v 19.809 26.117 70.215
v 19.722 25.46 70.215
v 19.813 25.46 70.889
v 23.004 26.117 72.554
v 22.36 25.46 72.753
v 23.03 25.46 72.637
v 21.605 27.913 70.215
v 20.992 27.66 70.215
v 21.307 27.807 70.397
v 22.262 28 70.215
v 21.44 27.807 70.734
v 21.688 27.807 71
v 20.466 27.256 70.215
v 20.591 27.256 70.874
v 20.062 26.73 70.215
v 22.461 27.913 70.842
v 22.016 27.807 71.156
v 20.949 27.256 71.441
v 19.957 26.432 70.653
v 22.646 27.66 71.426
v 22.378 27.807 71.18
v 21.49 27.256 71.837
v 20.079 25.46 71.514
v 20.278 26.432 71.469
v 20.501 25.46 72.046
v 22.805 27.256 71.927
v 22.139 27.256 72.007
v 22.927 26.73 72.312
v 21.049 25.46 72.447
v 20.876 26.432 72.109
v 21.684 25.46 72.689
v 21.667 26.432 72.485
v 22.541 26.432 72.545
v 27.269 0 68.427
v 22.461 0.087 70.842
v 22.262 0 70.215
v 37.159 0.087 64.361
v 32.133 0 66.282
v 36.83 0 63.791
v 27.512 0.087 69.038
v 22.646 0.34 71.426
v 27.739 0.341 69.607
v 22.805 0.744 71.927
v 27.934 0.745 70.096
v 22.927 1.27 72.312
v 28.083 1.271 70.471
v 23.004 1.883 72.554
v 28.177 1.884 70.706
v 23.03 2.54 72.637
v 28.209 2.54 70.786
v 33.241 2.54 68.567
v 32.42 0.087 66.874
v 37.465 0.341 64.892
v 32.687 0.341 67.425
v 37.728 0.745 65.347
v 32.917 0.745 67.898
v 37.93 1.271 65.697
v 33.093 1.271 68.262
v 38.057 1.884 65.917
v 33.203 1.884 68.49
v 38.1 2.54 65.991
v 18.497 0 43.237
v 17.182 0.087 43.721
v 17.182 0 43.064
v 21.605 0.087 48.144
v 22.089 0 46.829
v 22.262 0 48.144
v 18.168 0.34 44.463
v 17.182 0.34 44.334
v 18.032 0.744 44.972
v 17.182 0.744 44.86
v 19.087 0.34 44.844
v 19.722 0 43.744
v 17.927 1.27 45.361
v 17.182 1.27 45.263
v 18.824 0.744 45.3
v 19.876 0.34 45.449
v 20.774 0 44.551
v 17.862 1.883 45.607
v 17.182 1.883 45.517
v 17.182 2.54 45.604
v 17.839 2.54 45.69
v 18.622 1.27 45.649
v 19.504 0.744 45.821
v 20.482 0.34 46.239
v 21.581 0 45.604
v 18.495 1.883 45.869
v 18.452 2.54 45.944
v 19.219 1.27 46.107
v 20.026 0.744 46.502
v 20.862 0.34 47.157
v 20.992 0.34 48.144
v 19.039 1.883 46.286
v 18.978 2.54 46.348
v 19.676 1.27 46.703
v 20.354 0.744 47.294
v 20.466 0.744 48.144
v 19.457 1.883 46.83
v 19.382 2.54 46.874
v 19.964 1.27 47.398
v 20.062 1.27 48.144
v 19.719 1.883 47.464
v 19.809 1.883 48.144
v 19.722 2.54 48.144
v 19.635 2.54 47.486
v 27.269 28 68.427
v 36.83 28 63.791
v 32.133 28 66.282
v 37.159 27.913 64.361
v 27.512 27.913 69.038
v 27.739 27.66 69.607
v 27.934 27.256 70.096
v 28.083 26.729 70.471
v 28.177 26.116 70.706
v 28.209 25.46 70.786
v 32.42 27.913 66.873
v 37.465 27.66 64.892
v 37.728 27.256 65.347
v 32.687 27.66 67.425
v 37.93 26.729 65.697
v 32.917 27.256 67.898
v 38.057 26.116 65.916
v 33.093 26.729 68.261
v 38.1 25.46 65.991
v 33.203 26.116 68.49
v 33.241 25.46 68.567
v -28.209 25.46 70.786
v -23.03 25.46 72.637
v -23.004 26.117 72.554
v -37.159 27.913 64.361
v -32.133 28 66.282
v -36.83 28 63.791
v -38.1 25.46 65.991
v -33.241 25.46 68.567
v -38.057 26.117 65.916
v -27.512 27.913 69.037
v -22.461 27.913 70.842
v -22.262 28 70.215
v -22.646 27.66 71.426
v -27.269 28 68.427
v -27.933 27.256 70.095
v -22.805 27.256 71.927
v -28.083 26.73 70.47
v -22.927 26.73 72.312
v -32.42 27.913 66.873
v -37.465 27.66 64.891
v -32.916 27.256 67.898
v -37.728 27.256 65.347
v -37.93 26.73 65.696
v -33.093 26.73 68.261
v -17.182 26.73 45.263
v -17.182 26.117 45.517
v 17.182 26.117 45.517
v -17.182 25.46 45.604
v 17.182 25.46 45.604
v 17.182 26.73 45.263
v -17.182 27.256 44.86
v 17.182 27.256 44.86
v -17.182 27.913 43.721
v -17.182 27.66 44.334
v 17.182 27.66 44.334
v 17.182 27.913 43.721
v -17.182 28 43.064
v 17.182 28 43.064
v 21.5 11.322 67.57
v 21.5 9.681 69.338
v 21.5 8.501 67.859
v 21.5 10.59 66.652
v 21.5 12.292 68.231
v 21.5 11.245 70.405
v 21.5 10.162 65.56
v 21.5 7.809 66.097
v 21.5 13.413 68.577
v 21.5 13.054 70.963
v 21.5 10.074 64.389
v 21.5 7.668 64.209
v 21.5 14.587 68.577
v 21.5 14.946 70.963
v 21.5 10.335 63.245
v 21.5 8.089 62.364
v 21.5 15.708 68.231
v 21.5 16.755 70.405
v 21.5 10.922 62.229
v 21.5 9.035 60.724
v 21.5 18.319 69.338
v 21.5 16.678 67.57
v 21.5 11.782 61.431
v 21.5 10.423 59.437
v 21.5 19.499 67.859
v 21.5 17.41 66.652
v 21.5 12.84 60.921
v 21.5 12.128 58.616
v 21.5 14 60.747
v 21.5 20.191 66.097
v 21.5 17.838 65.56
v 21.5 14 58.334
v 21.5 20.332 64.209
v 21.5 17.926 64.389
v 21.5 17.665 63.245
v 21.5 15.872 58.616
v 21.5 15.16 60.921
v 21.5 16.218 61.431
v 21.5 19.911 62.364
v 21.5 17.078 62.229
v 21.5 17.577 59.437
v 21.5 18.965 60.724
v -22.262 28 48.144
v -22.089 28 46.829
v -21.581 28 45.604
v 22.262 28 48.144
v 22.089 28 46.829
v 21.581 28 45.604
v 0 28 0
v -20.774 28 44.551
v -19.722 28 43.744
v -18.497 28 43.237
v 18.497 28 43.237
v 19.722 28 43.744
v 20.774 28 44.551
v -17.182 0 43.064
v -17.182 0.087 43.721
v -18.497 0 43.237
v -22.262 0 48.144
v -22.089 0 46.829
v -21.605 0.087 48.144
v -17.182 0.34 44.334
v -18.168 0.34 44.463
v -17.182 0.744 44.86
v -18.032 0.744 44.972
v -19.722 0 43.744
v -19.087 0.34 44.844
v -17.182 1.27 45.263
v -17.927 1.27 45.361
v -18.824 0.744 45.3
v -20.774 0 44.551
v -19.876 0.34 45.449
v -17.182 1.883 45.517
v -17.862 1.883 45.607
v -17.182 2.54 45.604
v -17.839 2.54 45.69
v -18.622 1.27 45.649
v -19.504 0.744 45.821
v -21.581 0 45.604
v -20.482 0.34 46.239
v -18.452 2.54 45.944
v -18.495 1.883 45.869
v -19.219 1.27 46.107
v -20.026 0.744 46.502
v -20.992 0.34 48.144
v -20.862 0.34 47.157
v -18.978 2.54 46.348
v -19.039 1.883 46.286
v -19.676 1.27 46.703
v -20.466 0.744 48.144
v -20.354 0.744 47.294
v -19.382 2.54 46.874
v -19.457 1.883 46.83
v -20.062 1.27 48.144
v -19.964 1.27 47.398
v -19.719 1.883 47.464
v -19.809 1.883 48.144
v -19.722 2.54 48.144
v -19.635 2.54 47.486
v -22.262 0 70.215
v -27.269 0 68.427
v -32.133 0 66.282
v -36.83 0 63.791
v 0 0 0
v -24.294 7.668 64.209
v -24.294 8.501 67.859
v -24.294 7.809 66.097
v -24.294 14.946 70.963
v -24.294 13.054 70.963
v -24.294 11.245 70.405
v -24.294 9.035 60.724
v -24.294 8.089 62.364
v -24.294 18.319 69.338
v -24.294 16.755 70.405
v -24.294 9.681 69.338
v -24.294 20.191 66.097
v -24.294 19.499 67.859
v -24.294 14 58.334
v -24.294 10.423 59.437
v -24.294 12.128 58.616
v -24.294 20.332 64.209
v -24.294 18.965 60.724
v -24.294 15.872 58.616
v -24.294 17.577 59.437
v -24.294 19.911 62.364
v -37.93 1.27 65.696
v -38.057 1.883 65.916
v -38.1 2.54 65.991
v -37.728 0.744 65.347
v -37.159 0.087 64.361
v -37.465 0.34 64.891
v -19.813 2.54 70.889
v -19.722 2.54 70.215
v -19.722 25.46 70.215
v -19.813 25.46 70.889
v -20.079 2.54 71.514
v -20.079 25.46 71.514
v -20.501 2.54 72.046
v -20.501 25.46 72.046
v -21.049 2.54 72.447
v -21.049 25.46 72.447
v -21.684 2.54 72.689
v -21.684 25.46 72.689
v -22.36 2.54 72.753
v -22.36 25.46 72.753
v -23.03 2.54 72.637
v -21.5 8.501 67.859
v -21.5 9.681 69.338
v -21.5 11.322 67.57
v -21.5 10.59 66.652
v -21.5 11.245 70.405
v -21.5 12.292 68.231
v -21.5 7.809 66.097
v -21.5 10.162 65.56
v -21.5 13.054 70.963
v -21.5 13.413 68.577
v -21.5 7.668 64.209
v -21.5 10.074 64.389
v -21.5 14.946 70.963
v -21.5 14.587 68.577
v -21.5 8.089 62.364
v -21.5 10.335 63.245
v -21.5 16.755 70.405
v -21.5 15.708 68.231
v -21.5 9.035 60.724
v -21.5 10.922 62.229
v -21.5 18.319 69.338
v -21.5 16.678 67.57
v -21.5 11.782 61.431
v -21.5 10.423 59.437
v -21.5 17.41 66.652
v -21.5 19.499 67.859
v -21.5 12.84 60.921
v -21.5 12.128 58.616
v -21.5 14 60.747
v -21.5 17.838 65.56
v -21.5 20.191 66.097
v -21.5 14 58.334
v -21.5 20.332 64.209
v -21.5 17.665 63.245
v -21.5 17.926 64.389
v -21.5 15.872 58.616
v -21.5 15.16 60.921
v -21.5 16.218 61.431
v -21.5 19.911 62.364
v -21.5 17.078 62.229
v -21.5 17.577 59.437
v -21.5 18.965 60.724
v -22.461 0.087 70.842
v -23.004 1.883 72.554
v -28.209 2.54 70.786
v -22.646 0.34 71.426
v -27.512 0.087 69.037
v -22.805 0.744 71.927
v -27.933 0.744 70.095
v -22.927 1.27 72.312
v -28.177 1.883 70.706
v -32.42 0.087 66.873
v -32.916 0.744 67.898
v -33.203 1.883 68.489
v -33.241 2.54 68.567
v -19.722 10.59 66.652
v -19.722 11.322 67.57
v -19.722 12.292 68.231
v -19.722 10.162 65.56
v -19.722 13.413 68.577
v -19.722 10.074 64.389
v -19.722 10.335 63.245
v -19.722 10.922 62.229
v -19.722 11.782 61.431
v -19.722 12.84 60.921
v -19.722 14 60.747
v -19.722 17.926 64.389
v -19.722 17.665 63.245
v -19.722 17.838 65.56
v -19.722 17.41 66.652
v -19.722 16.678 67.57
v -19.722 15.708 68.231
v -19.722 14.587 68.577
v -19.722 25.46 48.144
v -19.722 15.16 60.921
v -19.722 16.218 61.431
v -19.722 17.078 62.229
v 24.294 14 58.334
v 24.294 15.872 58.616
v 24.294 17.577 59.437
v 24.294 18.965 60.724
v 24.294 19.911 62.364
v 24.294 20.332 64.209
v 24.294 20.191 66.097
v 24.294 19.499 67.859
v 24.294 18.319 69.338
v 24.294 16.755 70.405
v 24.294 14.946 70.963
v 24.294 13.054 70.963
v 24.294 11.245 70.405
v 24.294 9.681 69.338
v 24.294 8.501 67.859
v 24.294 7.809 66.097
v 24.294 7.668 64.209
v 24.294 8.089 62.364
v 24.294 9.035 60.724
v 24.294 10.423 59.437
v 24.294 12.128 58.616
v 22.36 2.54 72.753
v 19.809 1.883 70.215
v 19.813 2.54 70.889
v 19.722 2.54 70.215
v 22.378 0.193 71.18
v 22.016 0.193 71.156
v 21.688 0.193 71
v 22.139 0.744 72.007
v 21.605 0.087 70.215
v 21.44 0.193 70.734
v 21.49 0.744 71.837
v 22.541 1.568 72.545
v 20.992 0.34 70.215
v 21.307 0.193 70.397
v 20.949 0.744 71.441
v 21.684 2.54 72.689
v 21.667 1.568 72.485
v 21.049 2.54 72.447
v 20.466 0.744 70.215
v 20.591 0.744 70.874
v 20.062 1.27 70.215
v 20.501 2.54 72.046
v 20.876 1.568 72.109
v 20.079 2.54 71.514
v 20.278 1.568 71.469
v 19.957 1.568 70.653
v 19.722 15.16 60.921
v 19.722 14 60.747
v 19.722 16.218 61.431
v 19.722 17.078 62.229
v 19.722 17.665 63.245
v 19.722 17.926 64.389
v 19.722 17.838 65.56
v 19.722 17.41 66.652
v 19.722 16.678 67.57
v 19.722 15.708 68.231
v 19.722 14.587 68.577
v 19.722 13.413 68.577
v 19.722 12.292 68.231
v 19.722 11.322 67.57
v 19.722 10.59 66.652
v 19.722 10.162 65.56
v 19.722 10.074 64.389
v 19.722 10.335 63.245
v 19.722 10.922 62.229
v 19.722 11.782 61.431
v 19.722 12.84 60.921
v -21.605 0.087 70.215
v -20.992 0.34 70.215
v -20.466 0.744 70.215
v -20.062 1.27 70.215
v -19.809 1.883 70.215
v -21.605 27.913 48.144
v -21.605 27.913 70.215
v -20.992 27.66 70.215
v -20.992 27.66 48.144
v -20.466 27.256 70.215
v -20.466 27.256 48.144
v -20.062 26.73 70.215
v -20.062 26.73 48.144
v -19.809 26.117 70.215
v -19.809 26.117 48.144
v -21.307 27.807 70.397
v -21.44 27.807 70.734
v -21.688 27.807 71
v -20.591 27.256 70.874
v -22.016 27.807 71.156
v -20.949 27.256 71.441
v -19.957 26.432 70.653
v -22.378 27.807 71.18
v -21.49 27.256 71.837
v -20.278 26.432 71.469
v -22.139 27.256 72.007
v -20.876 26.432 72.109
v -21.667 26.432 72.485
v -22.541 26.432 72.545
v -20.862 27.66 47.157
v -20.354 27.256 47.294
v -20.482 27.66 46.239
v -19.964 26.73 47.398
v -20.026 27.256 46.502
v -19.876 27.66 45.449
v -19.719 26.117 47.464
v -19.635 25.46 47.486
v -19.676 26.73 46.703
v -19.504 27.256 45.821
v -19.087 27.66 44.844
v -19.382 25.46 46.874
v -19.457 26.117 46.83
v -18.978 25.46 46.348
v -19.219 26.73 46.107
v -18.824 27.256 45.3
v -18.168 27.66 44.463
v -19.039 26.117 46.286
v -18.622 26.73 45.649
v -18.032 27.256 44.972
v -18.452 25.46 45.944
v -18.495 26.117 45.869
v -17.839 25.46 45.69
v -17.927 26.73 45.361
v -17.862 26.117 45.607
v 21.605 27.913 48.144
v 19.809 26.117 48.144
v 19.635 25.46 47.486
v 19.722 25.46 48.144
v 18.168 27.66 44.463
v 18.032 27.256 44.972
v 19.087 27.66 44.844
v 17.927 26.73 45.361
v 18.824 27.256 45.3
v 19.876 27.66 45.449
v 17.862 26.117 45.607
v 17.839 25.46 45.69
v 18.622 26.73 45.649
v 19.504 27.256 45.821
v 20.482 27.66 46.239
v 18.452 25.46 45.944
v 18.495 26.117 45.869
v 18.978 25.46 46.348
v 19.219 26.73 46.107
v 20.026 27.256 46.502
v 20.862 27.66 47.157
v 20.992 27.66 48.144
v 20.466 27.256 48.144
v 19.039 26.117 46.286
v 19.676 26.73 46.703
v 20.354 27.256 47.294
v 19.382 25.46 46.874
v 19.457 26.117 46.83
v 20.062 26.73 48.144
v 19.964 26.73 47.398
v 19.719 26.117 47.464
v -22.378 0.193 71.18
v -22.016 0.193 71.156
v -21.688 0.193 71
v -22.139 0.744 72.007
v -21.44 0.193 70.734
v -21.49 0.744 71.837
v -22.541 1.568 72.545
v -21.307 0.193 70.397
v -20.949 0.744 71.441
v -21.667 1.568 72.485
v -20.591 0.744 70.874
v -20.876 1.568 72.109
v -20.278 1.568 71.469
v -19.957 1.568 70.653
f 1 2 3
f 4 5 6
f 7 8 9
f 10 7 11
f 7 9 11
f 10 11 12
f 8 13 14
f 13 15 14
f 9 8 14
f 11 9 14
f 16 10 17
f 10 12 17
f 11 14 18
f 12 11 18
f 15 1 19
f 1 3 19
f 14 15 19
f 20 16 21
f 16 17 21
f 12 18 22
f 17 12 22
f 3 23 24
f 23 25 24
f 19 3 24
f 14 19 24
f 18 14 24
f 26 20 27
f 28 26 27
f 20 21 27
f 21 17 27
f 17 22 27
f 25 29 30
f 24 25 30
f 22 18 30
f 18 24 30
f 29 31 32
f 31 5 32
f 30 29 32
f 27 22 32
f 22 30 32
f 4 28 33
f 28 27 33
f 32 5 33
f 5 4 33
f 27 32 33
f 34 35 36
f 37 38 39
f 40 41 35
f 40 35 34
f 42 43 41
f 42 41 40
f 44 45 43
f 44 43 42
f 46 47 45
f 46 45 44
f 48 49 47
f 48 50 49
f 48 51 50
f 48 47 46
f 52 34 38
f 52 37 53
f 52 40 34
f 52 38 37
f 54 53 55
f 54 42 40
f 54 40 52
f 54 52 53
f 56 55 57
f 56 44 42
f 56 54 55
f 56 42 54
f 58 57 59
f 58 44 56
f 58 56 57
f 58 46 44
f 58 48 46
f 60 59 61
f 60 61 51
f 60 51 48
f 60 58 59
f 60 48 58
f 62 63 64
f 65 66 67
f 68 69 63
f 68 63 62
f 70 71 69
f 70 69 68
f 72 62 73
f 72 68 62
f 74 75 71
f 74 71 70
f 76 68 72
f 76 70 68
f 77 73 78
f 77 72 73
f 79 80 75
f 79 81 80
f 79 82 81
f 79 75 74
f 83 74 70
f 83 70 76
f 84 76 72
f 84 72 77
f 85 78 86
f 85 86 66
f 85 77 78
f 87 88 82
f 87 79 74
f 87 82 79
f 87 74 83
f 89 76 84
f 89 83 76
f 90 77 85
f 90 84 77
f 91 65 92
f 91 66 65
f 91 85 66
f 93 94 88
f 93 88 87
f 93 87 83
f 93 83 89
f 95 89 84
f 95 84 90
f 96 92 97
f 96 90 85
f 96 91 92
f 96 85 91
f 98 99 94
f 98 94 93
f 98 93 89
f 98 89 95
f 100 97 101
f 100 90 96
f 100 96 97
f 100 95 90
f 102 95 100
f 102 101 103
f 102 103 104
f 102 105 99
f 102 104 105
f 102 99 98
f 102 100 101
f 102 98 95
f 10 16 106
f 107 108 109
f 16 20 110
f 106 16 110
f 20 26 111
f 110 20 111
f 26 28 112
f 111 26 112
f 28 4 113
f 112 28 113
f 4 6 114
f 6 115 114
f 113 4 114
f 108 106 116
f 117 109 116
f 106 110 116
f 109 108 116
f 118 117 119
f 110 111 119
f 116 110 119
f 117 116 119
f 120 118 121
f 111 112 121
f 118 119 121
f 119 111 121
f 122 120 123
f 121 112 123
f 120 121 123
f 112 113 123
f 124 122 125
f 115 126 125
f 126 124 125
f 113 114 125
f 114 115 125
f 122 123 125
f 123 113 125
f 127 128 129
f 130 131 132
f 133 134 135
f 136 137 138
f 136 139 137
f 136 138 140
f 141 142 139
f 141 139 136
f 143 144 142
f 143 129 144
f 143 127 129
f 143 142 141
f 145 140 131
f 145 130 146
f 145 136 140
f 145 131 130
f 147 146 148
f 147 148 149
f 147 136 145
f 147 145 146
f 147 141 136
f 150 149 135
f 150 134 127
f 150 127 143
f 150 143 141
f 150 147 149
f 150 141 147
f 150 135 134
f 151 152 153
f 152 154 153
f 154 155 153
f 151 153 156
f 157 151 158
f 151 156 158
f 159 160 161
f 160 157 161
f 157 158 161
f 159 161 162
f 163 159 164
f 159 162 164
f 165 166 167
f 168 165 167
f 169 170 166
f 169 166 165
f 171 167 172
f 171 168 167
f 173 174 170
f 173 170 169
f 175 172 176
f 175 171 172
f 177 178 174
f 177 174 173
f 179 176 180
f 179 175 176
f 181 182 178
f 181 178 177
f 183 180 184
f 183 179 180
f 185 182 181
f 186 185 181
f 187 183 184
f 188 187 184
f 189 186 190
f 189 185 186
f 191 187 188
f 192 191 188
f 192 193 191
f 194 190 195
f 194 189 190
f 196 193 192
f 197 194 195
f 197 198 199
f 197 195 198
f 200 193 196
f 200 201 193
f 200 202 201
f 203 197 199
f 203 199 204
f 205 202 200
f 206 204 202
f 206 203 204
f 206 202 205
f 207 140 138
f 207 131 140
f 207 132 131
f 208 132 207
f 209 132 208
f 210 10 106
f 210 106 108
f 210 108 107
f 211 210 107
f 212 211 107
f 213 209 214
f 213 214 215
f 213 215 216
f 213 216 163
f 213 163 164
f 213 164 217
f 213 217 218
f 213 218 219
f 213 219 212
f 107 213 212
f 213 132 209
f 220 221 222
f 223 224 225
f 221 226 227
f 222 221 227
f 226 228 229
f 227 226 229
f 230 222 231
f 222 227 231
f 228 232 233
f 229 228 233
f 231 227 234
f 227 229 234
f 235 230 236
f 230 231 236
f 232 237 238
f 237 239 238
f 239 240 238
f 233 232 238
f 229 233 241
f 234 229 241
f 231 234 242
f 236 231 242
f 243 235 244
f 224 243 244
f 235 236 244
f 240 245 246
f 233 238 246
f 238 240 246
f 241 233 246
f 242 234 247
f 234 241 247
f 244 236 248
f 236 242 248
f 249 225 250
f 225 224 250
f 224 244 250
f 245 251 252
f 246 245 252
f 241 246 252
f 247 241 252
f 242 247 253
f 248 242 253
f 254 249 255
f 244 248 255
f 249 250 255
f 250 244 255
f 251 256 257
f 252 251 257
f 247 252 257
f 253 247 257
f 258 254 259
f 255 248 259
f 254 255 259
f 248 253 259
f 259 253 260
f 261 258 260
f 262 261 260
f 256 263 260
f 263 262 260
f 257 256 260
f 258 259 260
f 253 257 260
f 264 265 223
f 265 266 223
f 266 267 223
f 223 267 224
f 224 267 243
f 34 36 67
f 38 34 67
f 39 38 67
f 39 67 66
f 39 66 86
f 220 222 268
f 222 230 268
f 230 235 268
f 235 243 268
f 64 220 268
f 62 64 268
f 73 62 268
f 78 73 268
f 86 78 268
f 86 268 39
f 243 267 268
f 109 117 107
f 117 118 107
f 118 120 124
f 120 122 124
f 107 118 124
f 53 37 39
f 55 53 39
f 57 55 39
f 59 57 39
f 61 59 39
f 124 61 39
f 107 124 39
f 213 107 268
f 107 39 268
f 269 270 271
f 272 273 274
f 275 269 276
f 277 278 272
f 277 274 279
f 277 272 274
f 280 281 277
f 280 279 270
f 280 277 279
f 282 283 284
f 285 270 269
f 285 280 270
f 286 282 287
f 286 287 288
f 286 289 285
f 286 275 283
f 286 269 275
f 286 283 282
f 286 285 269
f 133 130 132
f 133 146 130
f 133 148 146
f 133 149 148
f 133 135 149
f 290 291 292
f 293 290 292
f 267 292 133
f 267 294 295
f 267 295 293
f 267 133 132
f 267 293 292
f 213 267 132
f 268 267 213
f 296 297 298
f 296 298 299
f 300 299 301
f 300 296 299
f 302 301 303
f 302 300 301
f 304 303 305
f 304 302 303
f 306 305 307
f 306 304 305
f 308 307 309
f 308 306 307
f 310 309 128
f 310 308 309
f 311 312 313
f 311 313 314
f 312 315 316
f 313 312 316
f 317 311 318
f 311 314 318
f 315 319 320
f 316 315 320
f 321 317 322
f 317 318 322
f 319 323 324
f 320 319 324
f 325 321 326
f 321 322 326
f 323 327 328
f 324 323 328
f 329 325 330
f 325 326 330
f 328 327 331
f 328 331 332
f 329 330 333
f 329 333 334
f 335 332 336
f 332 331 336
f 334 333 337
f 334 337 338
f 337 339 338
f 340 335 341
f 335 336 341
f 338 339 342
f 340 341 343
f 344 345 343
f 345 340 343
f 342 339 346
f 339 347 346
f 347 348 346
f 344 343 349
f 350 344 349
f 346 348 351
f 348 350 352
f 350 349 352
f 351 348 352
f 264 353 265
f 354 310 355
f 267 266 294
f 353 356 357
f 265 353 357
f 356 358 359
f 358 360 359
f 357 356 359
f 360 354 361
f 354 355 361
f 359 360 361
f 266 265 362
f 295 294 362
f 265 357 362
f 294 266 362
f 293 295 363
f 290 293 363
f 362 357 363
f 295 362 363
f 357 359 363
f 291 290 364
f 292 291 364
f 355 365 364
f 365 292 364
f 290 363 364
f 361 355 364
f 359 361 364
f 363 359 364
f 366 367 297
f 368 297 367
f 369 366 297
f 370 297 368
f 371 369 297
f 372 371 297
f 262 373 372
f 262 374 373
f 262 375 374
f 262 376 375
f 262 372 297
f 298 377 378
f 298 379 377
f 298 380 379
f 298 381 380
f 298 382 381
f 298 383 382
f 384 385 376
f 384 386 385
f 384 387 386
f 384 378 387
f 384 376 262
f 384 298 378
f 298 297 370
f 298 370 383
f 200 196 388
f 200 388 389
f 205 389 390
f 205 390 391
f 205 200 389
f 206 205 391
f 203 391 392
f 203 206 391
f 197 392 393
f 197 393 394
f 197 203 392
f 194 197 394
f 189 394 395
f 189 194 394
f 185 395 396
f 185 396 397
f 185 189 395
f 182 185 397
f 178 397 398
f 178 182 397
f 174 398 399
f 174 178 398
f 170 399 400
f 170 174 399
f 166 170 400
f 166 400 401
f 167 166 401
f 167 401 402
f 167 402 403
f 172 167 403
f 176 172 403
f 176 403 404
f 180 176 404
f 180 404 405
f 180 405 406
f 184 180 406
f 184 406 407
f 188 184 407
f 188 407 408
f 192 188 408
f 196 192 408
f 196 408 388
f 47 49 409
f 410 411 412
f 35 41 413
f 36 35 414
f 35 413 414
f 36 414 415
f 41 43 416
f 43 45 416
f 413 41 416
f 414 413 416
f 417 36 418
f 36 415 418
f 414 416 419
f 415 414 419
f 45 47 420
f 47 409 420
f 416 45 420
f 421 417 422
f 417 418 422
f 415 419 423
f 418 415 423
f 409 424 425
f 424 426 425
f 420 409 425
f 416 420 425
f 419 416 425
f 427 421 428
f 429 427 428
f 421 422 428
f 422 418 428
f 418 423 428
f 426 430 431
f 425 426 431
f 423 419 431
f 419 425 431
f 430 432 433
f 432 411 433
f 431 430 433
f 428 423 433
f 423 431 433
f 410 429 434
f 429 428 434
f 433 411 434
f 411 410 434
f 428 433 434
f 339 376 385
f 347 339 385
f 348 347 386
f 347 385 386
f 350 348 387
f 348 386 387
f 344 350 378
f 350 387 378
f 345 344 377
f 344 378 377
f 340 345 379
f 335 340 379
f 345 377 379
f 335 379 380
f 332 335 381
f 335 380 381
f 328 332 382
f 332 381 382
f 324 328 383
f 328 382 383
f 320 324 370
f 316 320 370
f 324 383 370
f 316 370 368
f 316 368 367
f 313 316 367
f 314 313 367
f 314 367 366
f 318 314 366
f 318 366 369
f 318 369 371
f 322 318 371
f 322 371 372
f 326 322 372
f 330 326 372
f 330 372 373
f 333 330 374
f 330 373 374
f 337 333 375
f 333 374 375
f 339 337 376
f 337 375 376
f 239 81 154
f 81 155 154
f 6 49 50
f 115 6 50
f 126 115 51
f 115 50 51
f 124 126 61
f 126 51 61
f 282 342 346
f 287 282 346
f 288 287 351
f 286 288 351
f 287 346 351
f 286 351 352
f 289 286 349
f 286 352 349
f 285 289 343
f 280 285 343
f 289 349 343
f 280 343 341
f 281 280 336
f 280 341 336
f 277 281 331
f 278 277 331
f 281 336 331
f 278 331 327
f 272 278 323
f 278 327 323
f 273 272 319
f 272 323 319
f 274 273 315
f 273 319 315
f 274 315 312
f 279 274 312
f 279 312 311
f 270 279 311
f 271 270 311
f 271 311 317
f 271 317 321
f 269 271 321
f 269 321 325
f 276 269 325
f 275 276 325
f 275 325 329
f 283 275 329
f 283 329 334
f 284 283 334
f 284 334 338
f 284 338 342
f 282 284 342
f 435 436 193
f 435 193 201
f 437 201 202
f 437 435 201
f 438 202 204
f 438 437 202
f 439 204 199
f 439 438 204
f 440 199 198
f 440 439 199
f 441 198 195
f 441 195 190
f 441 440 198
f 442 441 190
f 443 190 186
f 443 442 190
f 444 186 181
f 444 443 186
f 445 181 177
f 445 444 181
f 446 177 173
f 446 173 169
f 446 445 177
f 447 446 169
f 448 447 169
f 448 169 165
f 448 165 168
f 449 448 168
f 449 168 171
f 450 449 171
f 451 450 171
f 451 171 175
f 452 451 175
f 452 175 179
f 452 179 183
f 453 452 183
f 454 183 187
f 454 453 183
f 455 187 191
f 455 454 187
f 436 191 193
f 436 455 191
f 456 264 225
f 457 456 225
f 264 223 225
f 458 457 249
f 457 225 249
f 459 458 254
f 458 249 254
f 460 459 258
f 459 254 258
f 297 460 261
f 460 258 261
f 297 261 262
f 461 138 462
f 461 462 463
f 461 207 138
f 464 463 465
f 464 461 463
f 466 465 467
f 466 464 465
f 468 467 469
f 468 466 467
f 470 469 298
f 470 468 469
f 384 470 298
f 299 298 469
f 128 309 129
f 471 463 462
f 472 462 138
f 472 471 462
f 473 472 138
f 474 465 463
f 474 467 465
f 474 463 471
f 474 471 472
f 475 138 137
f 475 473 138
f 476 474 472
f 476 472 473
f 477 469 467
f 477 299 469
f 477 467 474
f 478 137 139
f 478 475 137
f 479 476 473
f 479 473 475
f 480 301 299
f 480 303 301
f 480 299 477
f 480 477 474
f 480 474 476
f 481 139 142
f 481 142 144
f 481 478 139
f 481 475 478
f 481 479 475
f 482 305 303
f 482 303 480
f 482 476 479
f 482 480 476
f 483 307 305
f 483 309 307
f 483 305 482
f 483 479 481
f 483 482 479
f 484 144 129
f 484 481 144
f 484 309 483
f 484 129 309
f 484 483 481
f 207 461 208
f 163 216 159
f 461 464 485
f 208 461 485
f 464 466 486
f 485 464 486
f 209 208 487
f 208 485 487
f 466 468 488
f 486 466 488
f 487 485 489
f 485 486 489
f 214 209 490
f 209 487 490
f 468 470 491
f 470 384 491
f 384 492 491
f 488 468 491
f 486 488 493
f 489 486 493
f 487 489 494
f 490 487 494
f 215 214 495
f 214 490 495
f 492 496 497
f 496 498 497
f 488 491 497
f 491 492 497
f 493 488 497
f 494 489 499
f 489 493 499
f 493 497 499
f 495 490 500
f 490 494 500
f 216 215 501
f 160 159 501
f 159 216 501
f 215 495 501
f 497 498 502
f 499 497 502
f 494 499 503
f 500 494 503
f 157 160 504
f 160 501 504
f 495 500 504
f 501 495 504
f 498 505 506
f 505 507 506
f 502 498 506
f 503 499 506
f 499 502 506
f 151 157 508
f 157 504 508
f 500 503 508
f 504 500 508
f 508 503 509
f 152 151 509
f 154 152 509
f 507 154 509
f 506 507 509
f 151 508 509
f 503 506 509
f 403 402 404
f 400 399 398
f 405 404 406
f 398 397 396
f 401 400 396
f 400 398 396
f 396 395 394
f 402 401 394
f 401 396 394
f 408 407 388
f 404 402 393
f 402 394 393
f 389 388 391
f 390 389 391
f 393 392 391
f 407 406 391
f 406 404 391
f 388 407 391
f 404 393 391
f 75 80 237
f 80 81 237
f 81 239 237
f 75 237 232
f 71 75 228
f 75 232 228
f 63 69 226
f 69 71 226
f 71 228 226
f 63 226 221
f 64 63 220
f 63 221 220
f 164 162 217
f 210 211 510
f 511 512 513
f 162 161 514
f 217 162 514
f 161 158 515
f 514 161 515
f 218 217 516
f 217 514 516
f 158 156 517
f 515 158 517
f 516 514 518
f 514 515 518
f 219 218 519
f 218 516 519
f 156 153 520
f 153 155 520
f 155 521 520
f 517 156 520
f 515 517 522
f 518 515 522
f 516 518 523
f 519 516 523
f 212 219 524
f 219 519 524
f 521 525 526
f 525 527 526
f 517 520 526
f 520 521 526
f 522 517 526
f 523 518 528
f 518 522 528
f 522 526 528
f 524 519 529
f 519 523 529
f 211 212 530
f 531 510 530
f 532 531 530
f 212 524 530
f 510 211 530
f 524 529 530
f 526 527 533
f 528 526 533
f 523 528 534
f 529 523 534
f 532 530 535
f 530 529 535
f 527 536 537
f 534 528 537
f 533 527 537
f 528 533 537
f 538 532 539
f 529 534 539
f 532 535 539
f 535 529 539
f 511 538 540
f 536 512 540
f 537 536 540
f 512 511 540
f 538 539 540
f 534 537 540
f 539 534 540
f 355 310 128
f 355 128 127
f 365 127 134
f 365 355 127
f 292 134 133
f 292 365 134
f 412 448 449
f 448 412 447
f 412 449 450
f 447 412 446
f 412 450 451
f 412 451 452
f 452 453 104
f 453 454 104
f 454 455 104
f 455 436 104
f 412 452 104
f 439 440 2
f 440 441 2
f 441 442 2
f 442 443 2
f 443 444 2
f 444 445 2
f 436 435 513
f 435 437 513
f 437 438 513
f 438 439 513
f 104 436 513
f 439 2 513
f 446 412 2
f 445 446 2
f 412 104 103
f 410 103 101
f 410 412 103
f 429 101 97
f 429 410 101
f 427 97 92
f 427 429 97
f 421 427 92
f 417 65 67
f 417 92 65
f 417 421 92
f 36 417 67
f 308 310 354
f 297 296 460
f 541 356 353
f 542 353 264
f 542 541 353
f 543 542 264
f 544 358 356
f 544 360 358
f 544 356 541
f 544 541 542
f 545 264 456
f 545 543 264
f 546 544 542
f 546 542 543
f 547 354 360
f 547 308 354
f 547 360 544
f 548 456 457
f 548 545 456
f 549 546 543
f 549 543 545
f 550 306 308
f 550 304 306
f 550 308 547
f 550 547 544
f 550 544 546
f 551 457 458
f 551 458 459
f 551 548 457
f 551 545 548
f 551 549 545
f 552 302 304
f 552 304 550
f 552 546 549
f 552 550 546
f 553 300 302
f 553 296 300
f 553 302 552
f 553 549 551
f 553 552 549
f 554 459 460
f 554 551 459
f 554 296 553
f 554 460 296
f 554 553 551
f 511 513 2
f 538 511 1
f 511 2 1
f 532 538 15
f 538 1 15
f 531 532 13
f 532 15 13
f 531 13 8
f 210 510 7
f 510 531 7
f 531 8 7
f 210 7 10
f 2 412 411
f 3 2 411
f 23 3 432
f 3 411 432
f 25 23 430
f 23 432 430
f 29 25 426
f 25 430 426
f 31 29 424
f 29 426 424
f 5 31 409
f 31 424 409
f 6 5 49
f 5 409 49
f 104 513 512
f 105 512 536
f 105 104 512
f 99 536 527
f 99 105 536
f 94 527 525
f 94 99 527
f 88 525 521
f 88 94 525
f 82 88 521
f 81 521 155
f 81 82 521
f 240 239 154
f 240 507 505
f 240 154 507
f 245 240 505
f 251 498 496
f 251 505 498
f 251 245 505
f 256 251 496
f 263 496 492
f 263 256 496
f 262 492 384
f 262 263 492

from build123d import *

# Parameters (mm, degrees)
BOSS_EXTRUDE1_DEPTH = 28
CUT_EXTRUDE1_DEPTH  = 90.677477663
SKETCH5_R           = 6.35
CUT_EXTRUDE2_DEPTH  = 4.572
SKETCH8_R           = 6.35
SKETCH8_R_2         = 3.937
BOSS_EXTRUDE4_DEPTH = 1.778
FILLET1_R           = 2.54


with BuildPart() as part:
    # Sketch2 → Boss-Extrude1 (new body)
    with BuildSketch(Plane(origin=(0, 0, 0), x_dir=(1, 0, 0), z_dir=(0, 1, 0))):
        with BuildLine():
            Line((-38.1, -65.991135768), (0, 0))
            Line((0, 0), (0, -76.2))
            ThreePointArc((0, -76.2), (-19.722011237, -73.603547963), (-38.1, -65.991135768))
        make_face()
    boss_extrude1 = extrude(amount=BOSS_EXTRUDE1_DEPTH)

    # Sketch4 → Cut-Extrude1 (cut, symmetric)
    with BuildSketch(Plane(origin=(0, 28, 0), x_dir=(1, 0, 0), z_dir=(0, 1, 0))):
        Polygon((-19.722011237, -73.603547963), (-19.722011237, -45.603553163), (19.722011237, -45.603553163), (19.722011237, -73.603547963), (19.722011237, -89.083413221), (-19.722011237, -89.083413221), align=None)
    cut_extrude1 = extrude(amount=CUT_EXTRUDE1_DEPTH, both=True, mode=Mode.SUBTRACT)

    # Sketch5 → Cut-Extrude2 (cut)
    with BuildSketch(Plane(origin=(-19.722011237, 0, 0), x_dir=(0, 0, -1), z_dir=(1, 0, 0))):
        with Locations((-64.683550563, 14)):
            Circle(SKETCH5_R)
    cut_extrude2 = extrude(amount=-CUT_EXTRUDE2_DEPTH, mode=Mode.SUBTRACT)

    # Sketch8 → Boss-Extrude4 (add)
    with BuildSketch(Plane(origin=(-19.722011237, 0, 0), x_dir=(0, 0, -1), z_dir=(1, 0, 0))):
        with Locations((-64.683550563, 14)):
            Circle(SKETCH8_R)
        with Locations((-64.683550563, 14)):
            Circle(SKETCH8_R_2, mode=Mode.SUBTRACT)
    boss_extrude4 = extrude(amount=-BOSS_EXTRUDE4_DEPTH)

    # Mirror1: Boss-Extrude1, Cut-Extrude1, Cut-Extrude2, Boss-Extrude4 across plane
    add(boss_extrude1.mirror(Plane(origin=(0, 28, 0), x_dir=(0, 0, 1), z_dir=(-1, 0, 0))))
    add(cut_extrude1.mirror(Plane(origin=(0, 28, 0), x_dir=(0, 0, 1), z_dir=(-1, 0, 0))), mode=Mode.SUBTRACT)
    add(cut_extrude2.mirror(Plane(origin=(0, 28, 0), x_dir=(0, 0, 1), z_dir=(-1, 0, 0))), mode=Mode.SUBTRACT)
    add(boss_extrude4.mirror(Plane(origin=(0, 28, 0), x_dir=(0, 0, 1), z_dir=(-1, 0, 0))))

    # Fillet1
    fillet1_edges = [part.edges().sort_by_distance(p)[0] for p in [
        (0, 0, 45.603553163),
        (-29.160477546, 28, 70.399620377),
        (-19.722011237, 0, 59.603550563),
        (-19.722011237, 14, 73.603547963),
        (-19.722011237, 28, 59.603550563),
        (0, 28, 45.603553163),
        (-19.722011237, 14, 45.603553163),
        (-29.160477546, 0, 70.399620377),
        (29.160477546, 28, 70.399620377),
        (29.160477546, 0, 70.399620377),
        (19.722011237, 0, 59.603550563),
        (19.722011237, 14, 73.603547963),
        (19.722011237, 28, 59.603550563),
        (19.722011237, 14, 45.603553163),
    ]]
    fillet(fillet1_edges, radius=FILLET1_R)


solid = part.part
